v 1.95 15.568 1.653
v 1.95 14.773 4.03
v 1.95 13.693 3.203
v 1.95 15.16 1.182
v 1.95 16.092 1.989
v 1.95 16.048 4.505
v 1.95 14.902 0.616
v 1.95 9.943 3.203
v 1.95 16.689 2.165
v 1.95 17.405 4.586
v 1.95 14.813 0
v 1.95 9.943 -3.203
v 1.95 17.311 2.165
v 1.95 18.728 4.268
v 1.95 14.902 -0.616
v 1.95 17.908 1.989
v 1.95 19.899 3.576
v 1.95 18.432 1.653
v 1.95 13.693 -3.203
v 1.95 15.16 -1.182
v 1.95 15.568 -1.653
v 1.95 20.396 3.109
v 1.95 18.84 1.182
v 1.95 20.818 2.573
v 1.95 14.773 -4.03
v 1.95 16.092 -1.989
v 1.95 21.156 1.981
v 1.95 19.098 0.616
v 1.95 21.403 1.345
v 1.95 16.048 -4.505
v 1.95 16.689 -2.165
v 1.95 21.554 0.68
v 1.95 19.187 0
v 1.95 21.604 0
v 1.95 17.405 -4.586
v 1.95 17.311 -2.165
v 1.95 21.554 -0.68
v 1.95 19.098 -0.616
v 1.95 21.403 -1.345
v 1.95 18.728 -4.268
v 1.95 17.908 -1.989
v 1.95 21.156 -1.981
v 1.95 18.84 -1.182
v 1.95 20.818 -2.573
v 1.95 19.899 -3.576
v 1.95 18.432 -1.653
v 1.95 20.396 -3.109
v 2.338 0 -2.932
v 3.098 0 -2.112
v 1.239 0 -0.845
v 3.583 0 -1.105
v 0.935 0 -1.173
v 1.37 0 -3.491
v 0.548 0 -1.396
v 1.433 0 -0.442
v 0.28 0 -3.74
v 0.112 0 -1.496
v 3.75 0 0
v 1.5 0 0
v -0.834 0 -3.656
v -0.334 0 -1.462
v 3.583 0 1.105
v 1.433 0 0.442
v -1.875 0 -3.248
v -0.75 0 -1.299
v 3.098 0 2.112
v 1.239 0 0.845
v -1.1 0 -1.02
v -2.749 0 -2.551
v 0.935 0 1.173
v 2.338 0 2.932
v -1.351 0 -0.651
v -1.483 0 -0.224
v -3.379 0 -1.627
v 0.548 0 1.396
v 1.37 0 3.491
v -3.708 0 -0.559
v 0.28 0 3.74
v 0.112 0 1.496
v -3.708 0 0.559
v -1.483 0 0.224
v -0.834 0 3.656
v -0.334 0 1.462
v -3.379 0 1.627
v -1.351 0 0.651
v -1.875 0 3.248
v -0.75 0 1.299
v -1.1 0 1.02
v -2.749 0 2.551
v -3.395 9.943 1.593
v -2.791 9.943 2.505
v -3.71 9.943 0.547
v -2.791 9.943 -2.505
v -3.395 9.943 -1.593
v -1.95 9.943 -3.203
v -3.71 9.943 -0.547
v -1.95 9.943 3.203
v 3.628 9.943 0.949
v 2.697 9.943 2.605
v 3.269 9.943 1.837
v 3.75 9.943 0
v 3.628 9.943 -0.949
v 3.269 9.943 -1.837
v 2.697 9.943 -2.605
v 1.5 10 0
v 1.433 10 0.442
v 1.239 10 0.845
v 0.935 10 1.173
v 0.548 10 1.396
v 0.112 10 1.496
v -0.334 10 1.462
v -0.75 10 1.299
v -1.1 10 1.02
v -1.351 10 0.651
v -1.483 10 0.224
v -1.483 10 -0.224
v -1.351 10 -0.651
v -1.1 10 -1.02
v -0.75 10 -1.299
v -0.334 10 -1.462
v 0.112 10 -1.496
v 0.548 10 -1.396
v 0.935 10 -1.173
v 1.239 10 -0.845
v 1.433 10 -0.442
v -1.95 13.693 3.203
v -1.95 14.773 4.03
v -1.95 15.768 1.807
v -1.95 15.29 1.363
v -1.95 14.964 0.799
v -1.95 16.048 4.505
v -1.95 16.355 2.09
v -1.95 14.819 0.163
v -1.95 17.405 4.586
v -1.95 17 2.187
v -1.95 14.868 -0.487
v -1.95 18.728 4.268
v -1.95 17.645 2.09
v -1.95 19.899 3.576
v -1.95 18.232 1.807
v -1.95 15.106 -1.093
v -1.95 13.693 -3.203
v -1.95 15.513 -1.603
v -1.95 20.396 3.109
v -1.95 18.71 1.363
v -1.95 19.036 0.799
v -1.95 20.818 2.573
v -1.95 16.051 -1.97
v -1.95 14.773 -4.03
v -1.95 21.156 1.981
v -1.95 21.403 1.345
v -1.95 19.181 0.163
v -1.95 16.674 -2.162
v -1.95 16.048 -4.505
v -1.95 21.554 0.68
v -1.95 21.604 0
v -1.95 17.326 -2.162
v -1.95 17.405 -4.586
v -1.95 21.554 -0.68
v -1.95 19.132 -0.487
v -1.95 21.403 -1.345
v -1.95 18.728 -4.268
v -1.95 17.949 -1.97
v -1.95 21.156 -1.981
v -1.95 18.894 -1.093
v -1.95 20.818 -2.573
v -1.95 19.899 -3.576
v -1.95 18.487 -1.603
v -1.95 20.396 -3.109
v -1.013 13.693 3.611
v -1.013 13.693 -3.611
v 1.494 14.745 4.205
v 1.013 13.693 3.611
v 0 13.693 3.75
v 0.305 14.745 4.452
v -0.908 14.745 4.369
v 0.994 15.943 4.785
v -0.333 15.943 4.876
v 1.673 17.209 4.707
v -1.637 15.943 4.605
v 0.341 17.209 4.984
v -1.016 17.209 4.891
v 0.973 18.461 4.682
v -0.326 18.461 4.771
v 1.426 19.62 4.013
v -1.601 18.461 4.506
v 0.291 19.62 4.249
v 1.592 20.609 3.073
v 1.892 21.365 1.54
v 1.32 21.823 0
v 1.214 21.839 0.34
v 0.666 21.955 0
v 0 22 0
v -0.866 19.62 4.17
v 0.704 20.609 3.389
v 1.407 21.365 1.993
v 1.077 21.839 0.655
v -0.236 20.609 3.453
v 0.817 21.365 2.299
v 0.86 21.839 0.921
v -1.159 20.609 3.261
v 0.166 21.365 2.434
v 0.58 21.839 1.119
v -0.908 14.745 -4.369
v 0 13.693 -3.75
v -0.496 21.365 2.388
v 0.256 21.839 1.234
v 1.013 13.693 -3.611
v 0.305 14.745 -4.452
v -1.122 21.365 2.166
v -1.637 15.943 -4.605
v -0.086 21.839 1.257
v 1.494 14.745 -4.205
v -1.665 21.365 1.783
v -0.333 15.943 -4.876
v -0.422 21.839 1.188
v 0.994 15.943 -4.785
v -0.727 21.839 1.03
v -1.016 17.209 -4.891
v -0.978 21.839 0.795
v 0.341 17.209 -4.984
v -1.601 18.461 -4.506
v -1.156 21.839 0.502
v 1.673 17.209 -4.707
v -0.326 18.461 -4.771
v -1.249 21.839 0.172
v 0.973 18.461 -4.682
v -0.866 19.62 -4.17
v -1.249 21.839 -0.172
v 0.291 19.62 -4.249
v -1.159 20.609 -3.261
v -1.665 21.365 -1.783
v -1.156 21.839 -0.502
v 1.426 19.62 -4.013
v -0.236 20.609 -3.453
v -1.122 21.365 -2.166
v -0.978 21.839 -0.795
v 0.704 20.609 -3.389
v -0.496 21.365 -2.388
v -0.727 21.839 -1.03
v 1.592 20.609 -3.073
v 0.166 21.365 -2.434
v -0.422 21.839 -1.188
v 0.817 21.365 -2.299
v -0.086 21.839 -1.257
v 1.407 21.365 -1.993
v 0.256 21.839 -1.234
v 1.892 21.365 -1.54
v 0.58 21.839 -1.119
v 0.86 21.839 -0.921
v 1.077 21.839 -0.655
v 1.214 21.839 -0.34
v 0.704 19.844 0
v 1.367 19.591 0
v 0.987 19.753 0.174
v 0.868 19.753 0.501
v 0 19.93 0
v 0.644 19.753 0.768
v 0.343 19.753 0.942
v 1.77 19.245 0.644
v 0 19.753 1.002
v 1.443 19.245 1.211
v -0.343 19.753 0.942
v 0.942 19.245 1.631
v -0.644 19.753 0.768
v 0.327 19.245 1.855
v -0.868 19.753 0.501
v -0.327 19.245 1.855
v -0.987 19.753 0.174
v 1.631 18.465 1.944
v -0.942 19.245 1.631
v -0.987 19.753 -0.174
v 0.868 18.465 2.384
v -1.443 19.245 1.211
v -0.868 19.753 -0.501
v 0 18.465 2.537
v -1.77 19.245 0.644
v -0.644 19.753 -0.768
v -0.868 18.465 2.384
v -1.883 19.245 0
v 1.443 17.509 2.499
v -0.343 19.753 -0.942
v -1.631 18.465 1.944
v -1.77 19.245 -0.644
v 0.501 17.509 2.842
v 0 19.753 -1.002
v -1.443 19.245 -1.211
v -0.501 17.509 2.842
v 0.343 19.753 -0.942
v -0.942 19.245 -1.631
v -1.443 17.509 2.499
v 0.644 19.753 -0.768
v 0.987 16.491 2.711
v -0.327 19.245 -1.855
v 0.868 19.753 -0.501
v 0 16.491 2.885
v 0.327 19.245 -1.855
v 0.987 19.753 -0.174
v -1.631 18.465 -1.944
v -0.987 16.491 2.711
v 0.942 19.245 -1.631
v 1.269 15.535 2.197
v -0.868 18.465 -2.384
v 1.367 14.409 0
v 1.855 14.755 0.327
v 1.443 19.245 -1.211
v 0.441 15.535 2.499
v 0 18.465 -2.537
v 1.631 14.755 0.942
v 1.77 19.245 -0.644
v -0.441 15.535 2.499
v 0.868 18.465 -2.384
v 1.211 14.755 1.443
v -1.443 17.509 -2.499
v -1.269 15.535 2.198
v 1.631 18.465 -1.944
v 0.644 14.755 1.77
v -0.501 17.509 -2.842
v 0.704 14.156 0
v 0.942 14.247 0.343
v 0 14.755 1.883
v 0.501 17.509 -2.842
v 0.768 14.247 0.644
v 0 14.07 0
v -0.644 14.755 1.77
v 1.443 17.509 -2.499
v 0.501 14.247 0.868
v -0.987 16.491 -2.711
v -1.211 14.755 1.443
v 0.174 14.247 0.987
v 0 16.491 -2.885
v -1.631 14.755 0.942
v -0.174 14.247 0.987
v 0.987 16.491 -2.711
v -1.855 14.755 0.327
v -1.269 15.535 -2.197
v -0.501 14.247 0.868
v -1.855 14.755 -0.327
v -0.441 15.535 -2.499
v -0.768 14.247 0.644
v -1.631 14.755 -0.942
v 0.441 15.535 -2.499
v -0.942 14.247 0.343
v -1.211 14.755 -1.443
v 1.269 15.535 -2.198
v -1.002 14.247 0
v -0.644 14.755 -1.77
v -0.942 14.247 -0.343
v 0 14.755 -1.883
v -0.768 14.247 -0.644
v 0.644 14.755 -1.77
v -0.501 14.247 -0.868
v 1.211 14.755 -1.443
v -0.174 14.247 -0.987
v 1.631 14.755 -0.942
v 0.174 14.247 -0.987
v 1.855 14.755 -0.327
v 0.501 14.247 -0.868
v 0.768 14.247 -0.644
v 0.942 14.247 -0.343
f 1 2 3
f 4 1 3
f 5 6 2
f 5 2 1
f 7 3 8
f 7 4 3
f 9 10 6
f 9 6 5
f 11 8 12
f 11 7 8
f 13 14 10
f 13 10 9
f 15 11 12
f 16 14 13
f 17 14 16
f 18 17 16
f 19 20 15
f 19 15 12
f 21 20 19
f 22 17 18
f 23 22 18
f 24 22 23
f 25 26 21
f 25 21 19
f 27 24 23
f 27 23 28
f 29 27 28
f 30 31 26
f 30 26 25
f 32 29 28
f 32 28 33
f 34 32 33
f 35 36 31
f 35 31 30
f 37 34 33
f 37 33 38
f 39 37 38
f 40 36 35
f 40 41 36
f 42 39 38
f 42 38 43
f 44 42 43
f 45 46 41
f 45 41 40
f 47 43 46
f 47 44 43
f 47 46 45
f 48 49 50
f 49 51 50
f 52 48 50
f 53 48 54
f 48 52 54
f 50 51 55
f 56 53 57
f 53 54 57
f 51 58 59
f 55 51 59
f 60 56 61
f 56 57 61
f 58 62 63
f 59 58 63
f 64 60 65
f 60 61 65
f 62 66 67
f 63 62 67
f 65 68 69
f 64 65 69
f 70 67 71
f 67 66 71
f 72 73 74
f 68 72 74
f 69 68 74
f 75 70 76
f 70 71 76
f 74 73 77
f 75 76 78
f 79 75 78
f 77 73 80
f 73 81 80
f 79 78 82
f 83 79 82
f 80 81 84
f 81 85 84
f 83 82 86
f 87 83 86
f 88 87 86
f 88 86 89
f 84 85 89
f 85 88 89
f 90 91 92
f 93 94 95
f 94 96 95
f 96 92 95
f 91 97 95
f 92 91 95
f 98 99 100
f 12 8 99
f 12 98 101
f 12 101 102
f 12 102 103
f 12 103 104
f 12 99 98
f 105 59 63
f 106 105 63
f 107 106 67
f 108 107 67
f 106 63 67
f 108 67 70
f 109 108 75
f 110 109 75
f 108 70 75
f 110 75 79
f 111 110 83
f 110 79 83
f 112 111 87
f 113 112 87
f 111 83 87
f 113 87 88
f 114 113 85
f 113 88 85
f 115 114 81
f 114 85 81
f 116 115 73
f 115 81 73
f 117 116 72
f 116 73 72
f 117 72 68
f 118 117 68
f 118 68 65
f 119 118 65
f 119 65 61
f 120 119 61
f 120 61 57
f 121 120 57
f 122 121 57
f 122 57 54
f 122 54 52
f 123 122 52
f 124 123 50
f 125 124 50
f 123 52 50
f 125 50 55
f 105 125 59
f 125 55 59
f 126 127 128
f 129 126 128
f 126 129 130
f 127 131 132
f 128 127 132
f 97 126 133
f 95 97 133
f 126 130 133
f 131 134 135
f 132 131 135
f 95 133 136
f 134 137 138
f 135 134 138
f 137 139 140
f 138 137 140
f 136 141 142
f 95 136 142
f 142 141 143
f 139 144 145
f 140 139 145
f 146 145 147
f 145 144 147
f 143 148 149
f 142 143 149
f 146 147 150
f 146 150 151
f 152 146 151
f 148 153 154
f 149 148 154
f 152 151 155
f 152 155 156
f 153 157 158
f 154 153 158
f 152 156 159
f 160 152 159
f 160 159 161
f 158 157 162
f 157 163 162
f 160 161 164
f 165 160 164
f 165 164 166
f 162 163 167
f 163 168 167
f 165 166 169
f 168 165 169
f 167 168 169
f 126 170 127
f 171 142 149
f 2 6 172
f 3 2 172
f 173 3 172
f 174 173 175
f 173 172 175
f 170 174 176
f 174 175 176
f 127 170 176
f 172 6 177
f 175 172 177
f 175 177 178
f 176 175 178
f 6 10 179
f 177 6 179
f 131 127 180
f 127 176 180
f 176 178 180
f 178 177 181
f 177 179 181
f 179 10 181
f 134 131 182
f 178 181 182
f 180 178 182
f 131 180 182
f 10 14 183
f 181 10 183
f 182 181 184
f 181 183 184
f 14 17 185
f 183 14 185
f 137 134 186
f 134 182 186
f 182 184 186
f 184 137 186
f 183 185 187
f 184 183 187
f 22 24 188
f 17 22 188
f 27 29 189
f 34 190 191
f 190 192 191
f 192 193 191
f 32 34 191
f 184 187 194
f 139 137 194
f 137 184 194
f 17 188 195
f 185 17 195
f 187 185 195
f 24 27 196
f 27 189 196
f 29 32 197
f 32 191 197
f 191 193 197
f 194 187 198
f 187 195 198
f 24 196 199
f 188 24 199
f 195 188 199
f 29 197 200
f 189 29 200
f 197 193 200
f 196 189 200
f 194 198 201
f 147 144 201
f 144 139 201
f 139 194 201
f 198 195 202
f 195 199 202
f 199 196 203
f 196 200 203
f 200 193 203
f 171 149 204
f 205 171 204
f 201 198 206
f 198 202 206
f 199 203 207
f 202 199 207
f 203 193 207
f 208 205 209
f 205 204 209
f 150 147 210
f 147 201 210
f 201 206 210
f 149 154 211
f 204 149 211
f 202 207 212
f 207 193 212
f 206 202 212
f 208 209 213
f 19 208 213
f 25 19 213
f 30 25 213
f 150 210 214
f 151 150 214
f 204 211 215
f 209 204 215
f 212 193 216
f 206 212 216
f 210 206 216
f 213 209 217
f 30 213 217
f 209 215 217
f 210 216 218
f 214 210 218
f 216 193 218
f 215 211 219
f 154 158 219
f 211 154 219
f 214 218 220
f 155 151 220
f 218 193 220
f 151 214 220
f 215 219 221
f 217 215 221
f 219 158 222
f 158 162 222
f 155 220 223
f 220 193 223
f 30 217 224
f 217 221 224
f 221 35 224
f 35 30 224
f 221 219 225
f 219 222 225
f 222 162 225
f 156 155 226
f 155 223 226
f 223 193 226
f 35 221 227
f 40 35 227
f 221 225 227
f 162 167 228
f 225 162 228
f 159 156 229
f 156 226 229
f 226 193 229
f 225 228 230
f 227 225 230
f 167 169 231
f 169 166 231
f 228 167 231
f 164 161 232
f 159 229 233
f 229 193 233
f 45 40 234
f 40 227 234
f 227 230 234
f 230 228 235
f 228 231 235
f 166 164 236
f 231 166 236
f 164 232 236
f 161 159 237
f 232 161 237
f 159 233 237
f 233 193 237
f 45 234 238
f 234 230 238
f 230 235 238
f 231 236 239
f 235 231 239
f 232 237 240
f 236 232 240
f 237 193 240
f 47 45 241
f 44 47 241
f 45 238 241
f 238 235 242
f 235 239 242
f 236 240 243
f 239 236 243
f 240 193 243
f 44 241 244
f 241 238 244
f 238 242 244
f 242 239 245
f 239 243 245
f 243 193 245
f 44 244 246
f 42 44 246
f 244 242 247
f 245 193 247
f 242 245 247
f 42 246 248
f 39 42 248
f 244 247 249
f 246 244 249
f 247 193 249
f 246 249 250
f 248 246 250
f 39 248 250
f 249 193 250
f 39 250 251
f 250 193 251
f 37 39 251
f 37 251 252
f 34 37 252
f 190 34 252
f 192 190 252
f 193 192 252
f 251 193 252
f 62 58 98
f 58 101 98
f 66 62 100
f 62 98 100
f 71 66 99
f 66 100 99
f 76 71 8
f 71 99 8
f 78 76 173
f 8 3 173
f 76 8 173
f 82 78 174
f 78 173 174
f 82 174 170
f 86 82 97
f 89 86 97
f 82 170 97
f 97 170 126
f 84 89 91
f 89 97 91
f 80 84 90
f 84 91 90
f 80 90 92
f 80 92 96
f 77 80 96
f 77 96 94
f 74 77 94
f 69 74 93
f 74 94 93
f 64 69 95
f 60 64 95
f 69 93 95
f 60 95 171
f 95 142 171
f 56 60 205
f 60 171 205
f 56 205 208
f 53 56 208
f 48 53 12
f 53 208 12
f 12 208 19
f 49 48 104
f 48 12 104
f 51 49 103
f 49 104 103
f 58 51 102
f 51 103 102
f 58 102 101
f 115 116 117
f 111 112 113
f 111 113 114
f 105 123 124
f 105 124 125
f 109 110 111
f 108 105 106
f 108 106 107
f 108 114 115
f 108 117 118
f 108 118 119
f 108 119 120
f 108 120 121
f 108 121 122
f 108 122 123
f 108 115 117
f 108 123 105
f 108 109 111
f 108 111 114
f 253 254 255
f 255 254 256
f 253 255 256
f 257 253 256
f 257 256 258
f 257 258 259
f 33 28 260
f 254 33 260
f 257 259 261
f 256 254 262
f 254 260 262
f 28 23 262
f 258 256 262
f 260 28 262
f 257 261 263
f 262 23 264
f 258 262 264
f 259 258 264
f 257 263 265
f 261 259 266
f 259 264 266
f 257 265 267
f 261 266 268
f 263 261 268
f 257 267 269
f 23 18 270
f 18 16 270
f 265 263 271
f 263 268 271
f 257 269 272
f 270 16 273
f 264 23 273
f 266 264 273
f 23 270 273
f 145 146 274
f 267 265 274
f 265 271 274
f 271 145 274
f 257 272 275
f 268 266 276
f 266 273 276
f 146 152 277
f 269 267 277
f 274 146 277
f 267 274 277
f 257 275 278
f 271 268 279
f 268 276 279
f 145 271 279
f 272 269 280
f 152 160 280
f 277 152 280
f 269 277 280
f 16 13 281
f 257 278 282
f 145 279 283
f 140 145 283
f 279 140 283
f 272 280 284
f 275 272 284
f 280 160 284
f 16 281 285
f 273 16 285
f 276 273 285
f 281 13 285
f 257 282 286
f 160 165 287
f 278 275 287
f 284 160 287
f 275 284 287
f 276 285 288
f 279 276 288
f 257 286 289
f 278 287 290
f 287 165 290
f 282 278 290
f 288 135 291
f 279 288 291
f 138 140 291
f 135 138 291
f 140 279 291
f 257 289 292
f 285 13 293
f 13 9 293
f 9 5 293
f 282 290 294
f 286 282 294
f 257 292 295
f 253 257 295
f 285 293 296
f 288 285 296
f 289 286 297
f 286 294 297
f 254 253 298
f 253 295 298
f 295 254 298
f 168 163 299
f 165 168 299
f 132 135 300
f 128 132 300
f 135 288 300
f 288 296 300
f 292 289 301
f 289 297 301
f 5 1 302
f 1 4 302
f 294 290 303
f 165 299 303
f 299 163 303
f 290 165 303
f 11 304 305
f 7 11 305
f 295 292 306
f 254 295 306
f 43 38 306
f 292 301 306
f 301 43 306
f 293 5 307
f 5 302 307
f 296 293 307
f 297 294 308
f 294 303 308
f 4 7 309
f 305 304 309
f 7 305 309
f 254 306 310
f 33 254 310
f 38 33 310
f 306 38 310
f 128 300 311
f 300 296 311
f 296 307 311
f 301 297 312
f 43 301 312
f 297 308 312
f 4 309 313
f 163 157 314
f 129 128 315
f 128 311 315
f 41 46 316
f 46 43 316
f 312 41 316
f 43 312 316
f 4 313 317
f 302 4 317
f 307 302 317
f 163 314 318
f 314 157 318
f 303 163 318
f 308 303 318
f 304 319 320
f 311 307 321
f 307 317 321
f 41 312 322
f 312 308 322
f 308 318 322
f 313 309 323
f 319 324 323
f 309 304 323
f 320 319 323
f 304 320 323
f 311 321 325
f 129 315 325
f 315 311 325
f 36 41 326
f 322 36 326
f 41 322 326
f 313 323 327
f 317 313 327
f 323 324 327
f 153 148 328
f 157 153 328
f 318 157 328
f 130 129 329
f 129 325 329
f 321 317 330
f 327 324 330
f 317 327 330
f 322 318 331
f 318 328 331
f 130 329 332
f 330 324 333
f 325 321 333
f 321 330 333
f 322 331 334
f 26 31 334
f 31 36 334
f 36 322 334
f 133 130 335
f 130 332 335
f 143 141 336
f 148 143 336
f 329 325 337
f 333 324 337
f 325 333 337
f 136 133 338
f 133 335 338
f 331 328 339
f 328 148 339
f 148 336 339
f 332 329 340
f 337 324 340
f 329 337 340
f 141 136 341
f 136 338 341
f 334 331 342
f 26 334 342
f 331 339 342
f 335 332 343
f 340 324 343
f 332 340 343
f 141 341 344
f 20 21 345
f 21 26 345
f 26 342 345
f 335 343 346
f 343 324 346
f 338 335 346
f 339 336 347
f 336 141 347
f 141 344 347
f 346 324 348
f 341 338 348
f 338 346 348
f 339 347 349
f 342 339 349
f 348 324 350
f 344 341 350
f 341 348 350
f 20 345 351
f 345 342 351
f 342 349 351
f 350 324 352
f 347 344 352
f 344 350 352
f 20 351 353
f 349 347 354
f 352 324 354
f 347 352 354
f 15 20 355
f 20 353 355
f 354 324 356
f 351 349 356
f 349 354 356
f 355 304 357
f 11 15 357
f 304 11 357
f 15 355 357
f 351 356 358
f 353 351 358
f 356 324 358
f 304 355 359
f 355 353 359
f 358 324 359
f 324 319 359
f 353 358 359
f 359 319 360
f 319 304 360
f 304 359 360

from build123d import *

# Parameters (mm, degrees)
CUT_EXTRUDE1_START      = -1.8
CUT_EXTRUDE1_DEPTH      = 4.05
SKETCH6_R               = 1.5
CUT_EXTRUDE2_DEPTH      = 1
CUT_EXTRUDE2_DEPTH_BACK = 10


with BuildPart() as part:
    # Sketch4 → Revolve2 (revolve)
    with BuildSketch(Plane.XY):
        with BuildLine():
            Line((0, 13.692810861), (0, 0))
            Line((0, 0), (3.75, 0))
            Line((3.75, 0), (3.75, 13.692810861))
            ThreePointArc((3.75, 13.692810861), (4.557189139, 19.057189139), (0, 22))
            Line((0, 22), (0, 19.93))
            ThreePointArc((0, 19.93), (2.93, 17), (0, 14.07))
            Line((0, 14.07), (0, 13.692810861))
        make_face()
    revolve(axis=Axis((0, 26.788570074, 0), (0, -1, 0)))

    # Sketch5 → Cut-Extrude1 (cut)
    with BuildSketch(Plane(origin=(3.75, 0, 0), x_dir=(0, 0, -1), z_dir=(1, 0, 0)).offset(CUT_EXTRUDE1_START)):
        with BuildLine():
            Line((-3.75, 9.942810861), (3.75, 9.942810861))
            Line((3.75, 9.942810861), (3.75, 13.692810861))
            ThreePointArc((3.75, 13.692810861), (0, 22), (-3.75, 13.692810861))
            Line((-3.75, 13.692810861), (-3.75, 9.942810861))
        make_face()
    cut_extrude1 = extrude(amount=CUT_EXTRUDE1_DEPTH, mode=Mode.SUBTRACT)

    # Mirror2: Cut-Extrude1 across plane
    add(cut_extrude1.mirror(Plane(origin=(0, 0, 0), x_dir=(0, 0, 1), z_dir=(1, 0, 0))), mode=Mode.SUBTRACT)

    # Sketch6 → Cut-Extrude2 (cut, two sides)
    with BuildSketch(Plane.XZ) as cut_extrude2_sk:
        Circle(SKETCH6_R)
    extrude(amount=CUT_EXTRUDE2_DEPTH, mode=Mode.SUBTRACT)
    extrude(cut_extrude2_sk.sketch, amount=-CUT_EXTRUDE2_DEPTH_BACK, mode=Mode.SUBTRACT)


solid = part.part
